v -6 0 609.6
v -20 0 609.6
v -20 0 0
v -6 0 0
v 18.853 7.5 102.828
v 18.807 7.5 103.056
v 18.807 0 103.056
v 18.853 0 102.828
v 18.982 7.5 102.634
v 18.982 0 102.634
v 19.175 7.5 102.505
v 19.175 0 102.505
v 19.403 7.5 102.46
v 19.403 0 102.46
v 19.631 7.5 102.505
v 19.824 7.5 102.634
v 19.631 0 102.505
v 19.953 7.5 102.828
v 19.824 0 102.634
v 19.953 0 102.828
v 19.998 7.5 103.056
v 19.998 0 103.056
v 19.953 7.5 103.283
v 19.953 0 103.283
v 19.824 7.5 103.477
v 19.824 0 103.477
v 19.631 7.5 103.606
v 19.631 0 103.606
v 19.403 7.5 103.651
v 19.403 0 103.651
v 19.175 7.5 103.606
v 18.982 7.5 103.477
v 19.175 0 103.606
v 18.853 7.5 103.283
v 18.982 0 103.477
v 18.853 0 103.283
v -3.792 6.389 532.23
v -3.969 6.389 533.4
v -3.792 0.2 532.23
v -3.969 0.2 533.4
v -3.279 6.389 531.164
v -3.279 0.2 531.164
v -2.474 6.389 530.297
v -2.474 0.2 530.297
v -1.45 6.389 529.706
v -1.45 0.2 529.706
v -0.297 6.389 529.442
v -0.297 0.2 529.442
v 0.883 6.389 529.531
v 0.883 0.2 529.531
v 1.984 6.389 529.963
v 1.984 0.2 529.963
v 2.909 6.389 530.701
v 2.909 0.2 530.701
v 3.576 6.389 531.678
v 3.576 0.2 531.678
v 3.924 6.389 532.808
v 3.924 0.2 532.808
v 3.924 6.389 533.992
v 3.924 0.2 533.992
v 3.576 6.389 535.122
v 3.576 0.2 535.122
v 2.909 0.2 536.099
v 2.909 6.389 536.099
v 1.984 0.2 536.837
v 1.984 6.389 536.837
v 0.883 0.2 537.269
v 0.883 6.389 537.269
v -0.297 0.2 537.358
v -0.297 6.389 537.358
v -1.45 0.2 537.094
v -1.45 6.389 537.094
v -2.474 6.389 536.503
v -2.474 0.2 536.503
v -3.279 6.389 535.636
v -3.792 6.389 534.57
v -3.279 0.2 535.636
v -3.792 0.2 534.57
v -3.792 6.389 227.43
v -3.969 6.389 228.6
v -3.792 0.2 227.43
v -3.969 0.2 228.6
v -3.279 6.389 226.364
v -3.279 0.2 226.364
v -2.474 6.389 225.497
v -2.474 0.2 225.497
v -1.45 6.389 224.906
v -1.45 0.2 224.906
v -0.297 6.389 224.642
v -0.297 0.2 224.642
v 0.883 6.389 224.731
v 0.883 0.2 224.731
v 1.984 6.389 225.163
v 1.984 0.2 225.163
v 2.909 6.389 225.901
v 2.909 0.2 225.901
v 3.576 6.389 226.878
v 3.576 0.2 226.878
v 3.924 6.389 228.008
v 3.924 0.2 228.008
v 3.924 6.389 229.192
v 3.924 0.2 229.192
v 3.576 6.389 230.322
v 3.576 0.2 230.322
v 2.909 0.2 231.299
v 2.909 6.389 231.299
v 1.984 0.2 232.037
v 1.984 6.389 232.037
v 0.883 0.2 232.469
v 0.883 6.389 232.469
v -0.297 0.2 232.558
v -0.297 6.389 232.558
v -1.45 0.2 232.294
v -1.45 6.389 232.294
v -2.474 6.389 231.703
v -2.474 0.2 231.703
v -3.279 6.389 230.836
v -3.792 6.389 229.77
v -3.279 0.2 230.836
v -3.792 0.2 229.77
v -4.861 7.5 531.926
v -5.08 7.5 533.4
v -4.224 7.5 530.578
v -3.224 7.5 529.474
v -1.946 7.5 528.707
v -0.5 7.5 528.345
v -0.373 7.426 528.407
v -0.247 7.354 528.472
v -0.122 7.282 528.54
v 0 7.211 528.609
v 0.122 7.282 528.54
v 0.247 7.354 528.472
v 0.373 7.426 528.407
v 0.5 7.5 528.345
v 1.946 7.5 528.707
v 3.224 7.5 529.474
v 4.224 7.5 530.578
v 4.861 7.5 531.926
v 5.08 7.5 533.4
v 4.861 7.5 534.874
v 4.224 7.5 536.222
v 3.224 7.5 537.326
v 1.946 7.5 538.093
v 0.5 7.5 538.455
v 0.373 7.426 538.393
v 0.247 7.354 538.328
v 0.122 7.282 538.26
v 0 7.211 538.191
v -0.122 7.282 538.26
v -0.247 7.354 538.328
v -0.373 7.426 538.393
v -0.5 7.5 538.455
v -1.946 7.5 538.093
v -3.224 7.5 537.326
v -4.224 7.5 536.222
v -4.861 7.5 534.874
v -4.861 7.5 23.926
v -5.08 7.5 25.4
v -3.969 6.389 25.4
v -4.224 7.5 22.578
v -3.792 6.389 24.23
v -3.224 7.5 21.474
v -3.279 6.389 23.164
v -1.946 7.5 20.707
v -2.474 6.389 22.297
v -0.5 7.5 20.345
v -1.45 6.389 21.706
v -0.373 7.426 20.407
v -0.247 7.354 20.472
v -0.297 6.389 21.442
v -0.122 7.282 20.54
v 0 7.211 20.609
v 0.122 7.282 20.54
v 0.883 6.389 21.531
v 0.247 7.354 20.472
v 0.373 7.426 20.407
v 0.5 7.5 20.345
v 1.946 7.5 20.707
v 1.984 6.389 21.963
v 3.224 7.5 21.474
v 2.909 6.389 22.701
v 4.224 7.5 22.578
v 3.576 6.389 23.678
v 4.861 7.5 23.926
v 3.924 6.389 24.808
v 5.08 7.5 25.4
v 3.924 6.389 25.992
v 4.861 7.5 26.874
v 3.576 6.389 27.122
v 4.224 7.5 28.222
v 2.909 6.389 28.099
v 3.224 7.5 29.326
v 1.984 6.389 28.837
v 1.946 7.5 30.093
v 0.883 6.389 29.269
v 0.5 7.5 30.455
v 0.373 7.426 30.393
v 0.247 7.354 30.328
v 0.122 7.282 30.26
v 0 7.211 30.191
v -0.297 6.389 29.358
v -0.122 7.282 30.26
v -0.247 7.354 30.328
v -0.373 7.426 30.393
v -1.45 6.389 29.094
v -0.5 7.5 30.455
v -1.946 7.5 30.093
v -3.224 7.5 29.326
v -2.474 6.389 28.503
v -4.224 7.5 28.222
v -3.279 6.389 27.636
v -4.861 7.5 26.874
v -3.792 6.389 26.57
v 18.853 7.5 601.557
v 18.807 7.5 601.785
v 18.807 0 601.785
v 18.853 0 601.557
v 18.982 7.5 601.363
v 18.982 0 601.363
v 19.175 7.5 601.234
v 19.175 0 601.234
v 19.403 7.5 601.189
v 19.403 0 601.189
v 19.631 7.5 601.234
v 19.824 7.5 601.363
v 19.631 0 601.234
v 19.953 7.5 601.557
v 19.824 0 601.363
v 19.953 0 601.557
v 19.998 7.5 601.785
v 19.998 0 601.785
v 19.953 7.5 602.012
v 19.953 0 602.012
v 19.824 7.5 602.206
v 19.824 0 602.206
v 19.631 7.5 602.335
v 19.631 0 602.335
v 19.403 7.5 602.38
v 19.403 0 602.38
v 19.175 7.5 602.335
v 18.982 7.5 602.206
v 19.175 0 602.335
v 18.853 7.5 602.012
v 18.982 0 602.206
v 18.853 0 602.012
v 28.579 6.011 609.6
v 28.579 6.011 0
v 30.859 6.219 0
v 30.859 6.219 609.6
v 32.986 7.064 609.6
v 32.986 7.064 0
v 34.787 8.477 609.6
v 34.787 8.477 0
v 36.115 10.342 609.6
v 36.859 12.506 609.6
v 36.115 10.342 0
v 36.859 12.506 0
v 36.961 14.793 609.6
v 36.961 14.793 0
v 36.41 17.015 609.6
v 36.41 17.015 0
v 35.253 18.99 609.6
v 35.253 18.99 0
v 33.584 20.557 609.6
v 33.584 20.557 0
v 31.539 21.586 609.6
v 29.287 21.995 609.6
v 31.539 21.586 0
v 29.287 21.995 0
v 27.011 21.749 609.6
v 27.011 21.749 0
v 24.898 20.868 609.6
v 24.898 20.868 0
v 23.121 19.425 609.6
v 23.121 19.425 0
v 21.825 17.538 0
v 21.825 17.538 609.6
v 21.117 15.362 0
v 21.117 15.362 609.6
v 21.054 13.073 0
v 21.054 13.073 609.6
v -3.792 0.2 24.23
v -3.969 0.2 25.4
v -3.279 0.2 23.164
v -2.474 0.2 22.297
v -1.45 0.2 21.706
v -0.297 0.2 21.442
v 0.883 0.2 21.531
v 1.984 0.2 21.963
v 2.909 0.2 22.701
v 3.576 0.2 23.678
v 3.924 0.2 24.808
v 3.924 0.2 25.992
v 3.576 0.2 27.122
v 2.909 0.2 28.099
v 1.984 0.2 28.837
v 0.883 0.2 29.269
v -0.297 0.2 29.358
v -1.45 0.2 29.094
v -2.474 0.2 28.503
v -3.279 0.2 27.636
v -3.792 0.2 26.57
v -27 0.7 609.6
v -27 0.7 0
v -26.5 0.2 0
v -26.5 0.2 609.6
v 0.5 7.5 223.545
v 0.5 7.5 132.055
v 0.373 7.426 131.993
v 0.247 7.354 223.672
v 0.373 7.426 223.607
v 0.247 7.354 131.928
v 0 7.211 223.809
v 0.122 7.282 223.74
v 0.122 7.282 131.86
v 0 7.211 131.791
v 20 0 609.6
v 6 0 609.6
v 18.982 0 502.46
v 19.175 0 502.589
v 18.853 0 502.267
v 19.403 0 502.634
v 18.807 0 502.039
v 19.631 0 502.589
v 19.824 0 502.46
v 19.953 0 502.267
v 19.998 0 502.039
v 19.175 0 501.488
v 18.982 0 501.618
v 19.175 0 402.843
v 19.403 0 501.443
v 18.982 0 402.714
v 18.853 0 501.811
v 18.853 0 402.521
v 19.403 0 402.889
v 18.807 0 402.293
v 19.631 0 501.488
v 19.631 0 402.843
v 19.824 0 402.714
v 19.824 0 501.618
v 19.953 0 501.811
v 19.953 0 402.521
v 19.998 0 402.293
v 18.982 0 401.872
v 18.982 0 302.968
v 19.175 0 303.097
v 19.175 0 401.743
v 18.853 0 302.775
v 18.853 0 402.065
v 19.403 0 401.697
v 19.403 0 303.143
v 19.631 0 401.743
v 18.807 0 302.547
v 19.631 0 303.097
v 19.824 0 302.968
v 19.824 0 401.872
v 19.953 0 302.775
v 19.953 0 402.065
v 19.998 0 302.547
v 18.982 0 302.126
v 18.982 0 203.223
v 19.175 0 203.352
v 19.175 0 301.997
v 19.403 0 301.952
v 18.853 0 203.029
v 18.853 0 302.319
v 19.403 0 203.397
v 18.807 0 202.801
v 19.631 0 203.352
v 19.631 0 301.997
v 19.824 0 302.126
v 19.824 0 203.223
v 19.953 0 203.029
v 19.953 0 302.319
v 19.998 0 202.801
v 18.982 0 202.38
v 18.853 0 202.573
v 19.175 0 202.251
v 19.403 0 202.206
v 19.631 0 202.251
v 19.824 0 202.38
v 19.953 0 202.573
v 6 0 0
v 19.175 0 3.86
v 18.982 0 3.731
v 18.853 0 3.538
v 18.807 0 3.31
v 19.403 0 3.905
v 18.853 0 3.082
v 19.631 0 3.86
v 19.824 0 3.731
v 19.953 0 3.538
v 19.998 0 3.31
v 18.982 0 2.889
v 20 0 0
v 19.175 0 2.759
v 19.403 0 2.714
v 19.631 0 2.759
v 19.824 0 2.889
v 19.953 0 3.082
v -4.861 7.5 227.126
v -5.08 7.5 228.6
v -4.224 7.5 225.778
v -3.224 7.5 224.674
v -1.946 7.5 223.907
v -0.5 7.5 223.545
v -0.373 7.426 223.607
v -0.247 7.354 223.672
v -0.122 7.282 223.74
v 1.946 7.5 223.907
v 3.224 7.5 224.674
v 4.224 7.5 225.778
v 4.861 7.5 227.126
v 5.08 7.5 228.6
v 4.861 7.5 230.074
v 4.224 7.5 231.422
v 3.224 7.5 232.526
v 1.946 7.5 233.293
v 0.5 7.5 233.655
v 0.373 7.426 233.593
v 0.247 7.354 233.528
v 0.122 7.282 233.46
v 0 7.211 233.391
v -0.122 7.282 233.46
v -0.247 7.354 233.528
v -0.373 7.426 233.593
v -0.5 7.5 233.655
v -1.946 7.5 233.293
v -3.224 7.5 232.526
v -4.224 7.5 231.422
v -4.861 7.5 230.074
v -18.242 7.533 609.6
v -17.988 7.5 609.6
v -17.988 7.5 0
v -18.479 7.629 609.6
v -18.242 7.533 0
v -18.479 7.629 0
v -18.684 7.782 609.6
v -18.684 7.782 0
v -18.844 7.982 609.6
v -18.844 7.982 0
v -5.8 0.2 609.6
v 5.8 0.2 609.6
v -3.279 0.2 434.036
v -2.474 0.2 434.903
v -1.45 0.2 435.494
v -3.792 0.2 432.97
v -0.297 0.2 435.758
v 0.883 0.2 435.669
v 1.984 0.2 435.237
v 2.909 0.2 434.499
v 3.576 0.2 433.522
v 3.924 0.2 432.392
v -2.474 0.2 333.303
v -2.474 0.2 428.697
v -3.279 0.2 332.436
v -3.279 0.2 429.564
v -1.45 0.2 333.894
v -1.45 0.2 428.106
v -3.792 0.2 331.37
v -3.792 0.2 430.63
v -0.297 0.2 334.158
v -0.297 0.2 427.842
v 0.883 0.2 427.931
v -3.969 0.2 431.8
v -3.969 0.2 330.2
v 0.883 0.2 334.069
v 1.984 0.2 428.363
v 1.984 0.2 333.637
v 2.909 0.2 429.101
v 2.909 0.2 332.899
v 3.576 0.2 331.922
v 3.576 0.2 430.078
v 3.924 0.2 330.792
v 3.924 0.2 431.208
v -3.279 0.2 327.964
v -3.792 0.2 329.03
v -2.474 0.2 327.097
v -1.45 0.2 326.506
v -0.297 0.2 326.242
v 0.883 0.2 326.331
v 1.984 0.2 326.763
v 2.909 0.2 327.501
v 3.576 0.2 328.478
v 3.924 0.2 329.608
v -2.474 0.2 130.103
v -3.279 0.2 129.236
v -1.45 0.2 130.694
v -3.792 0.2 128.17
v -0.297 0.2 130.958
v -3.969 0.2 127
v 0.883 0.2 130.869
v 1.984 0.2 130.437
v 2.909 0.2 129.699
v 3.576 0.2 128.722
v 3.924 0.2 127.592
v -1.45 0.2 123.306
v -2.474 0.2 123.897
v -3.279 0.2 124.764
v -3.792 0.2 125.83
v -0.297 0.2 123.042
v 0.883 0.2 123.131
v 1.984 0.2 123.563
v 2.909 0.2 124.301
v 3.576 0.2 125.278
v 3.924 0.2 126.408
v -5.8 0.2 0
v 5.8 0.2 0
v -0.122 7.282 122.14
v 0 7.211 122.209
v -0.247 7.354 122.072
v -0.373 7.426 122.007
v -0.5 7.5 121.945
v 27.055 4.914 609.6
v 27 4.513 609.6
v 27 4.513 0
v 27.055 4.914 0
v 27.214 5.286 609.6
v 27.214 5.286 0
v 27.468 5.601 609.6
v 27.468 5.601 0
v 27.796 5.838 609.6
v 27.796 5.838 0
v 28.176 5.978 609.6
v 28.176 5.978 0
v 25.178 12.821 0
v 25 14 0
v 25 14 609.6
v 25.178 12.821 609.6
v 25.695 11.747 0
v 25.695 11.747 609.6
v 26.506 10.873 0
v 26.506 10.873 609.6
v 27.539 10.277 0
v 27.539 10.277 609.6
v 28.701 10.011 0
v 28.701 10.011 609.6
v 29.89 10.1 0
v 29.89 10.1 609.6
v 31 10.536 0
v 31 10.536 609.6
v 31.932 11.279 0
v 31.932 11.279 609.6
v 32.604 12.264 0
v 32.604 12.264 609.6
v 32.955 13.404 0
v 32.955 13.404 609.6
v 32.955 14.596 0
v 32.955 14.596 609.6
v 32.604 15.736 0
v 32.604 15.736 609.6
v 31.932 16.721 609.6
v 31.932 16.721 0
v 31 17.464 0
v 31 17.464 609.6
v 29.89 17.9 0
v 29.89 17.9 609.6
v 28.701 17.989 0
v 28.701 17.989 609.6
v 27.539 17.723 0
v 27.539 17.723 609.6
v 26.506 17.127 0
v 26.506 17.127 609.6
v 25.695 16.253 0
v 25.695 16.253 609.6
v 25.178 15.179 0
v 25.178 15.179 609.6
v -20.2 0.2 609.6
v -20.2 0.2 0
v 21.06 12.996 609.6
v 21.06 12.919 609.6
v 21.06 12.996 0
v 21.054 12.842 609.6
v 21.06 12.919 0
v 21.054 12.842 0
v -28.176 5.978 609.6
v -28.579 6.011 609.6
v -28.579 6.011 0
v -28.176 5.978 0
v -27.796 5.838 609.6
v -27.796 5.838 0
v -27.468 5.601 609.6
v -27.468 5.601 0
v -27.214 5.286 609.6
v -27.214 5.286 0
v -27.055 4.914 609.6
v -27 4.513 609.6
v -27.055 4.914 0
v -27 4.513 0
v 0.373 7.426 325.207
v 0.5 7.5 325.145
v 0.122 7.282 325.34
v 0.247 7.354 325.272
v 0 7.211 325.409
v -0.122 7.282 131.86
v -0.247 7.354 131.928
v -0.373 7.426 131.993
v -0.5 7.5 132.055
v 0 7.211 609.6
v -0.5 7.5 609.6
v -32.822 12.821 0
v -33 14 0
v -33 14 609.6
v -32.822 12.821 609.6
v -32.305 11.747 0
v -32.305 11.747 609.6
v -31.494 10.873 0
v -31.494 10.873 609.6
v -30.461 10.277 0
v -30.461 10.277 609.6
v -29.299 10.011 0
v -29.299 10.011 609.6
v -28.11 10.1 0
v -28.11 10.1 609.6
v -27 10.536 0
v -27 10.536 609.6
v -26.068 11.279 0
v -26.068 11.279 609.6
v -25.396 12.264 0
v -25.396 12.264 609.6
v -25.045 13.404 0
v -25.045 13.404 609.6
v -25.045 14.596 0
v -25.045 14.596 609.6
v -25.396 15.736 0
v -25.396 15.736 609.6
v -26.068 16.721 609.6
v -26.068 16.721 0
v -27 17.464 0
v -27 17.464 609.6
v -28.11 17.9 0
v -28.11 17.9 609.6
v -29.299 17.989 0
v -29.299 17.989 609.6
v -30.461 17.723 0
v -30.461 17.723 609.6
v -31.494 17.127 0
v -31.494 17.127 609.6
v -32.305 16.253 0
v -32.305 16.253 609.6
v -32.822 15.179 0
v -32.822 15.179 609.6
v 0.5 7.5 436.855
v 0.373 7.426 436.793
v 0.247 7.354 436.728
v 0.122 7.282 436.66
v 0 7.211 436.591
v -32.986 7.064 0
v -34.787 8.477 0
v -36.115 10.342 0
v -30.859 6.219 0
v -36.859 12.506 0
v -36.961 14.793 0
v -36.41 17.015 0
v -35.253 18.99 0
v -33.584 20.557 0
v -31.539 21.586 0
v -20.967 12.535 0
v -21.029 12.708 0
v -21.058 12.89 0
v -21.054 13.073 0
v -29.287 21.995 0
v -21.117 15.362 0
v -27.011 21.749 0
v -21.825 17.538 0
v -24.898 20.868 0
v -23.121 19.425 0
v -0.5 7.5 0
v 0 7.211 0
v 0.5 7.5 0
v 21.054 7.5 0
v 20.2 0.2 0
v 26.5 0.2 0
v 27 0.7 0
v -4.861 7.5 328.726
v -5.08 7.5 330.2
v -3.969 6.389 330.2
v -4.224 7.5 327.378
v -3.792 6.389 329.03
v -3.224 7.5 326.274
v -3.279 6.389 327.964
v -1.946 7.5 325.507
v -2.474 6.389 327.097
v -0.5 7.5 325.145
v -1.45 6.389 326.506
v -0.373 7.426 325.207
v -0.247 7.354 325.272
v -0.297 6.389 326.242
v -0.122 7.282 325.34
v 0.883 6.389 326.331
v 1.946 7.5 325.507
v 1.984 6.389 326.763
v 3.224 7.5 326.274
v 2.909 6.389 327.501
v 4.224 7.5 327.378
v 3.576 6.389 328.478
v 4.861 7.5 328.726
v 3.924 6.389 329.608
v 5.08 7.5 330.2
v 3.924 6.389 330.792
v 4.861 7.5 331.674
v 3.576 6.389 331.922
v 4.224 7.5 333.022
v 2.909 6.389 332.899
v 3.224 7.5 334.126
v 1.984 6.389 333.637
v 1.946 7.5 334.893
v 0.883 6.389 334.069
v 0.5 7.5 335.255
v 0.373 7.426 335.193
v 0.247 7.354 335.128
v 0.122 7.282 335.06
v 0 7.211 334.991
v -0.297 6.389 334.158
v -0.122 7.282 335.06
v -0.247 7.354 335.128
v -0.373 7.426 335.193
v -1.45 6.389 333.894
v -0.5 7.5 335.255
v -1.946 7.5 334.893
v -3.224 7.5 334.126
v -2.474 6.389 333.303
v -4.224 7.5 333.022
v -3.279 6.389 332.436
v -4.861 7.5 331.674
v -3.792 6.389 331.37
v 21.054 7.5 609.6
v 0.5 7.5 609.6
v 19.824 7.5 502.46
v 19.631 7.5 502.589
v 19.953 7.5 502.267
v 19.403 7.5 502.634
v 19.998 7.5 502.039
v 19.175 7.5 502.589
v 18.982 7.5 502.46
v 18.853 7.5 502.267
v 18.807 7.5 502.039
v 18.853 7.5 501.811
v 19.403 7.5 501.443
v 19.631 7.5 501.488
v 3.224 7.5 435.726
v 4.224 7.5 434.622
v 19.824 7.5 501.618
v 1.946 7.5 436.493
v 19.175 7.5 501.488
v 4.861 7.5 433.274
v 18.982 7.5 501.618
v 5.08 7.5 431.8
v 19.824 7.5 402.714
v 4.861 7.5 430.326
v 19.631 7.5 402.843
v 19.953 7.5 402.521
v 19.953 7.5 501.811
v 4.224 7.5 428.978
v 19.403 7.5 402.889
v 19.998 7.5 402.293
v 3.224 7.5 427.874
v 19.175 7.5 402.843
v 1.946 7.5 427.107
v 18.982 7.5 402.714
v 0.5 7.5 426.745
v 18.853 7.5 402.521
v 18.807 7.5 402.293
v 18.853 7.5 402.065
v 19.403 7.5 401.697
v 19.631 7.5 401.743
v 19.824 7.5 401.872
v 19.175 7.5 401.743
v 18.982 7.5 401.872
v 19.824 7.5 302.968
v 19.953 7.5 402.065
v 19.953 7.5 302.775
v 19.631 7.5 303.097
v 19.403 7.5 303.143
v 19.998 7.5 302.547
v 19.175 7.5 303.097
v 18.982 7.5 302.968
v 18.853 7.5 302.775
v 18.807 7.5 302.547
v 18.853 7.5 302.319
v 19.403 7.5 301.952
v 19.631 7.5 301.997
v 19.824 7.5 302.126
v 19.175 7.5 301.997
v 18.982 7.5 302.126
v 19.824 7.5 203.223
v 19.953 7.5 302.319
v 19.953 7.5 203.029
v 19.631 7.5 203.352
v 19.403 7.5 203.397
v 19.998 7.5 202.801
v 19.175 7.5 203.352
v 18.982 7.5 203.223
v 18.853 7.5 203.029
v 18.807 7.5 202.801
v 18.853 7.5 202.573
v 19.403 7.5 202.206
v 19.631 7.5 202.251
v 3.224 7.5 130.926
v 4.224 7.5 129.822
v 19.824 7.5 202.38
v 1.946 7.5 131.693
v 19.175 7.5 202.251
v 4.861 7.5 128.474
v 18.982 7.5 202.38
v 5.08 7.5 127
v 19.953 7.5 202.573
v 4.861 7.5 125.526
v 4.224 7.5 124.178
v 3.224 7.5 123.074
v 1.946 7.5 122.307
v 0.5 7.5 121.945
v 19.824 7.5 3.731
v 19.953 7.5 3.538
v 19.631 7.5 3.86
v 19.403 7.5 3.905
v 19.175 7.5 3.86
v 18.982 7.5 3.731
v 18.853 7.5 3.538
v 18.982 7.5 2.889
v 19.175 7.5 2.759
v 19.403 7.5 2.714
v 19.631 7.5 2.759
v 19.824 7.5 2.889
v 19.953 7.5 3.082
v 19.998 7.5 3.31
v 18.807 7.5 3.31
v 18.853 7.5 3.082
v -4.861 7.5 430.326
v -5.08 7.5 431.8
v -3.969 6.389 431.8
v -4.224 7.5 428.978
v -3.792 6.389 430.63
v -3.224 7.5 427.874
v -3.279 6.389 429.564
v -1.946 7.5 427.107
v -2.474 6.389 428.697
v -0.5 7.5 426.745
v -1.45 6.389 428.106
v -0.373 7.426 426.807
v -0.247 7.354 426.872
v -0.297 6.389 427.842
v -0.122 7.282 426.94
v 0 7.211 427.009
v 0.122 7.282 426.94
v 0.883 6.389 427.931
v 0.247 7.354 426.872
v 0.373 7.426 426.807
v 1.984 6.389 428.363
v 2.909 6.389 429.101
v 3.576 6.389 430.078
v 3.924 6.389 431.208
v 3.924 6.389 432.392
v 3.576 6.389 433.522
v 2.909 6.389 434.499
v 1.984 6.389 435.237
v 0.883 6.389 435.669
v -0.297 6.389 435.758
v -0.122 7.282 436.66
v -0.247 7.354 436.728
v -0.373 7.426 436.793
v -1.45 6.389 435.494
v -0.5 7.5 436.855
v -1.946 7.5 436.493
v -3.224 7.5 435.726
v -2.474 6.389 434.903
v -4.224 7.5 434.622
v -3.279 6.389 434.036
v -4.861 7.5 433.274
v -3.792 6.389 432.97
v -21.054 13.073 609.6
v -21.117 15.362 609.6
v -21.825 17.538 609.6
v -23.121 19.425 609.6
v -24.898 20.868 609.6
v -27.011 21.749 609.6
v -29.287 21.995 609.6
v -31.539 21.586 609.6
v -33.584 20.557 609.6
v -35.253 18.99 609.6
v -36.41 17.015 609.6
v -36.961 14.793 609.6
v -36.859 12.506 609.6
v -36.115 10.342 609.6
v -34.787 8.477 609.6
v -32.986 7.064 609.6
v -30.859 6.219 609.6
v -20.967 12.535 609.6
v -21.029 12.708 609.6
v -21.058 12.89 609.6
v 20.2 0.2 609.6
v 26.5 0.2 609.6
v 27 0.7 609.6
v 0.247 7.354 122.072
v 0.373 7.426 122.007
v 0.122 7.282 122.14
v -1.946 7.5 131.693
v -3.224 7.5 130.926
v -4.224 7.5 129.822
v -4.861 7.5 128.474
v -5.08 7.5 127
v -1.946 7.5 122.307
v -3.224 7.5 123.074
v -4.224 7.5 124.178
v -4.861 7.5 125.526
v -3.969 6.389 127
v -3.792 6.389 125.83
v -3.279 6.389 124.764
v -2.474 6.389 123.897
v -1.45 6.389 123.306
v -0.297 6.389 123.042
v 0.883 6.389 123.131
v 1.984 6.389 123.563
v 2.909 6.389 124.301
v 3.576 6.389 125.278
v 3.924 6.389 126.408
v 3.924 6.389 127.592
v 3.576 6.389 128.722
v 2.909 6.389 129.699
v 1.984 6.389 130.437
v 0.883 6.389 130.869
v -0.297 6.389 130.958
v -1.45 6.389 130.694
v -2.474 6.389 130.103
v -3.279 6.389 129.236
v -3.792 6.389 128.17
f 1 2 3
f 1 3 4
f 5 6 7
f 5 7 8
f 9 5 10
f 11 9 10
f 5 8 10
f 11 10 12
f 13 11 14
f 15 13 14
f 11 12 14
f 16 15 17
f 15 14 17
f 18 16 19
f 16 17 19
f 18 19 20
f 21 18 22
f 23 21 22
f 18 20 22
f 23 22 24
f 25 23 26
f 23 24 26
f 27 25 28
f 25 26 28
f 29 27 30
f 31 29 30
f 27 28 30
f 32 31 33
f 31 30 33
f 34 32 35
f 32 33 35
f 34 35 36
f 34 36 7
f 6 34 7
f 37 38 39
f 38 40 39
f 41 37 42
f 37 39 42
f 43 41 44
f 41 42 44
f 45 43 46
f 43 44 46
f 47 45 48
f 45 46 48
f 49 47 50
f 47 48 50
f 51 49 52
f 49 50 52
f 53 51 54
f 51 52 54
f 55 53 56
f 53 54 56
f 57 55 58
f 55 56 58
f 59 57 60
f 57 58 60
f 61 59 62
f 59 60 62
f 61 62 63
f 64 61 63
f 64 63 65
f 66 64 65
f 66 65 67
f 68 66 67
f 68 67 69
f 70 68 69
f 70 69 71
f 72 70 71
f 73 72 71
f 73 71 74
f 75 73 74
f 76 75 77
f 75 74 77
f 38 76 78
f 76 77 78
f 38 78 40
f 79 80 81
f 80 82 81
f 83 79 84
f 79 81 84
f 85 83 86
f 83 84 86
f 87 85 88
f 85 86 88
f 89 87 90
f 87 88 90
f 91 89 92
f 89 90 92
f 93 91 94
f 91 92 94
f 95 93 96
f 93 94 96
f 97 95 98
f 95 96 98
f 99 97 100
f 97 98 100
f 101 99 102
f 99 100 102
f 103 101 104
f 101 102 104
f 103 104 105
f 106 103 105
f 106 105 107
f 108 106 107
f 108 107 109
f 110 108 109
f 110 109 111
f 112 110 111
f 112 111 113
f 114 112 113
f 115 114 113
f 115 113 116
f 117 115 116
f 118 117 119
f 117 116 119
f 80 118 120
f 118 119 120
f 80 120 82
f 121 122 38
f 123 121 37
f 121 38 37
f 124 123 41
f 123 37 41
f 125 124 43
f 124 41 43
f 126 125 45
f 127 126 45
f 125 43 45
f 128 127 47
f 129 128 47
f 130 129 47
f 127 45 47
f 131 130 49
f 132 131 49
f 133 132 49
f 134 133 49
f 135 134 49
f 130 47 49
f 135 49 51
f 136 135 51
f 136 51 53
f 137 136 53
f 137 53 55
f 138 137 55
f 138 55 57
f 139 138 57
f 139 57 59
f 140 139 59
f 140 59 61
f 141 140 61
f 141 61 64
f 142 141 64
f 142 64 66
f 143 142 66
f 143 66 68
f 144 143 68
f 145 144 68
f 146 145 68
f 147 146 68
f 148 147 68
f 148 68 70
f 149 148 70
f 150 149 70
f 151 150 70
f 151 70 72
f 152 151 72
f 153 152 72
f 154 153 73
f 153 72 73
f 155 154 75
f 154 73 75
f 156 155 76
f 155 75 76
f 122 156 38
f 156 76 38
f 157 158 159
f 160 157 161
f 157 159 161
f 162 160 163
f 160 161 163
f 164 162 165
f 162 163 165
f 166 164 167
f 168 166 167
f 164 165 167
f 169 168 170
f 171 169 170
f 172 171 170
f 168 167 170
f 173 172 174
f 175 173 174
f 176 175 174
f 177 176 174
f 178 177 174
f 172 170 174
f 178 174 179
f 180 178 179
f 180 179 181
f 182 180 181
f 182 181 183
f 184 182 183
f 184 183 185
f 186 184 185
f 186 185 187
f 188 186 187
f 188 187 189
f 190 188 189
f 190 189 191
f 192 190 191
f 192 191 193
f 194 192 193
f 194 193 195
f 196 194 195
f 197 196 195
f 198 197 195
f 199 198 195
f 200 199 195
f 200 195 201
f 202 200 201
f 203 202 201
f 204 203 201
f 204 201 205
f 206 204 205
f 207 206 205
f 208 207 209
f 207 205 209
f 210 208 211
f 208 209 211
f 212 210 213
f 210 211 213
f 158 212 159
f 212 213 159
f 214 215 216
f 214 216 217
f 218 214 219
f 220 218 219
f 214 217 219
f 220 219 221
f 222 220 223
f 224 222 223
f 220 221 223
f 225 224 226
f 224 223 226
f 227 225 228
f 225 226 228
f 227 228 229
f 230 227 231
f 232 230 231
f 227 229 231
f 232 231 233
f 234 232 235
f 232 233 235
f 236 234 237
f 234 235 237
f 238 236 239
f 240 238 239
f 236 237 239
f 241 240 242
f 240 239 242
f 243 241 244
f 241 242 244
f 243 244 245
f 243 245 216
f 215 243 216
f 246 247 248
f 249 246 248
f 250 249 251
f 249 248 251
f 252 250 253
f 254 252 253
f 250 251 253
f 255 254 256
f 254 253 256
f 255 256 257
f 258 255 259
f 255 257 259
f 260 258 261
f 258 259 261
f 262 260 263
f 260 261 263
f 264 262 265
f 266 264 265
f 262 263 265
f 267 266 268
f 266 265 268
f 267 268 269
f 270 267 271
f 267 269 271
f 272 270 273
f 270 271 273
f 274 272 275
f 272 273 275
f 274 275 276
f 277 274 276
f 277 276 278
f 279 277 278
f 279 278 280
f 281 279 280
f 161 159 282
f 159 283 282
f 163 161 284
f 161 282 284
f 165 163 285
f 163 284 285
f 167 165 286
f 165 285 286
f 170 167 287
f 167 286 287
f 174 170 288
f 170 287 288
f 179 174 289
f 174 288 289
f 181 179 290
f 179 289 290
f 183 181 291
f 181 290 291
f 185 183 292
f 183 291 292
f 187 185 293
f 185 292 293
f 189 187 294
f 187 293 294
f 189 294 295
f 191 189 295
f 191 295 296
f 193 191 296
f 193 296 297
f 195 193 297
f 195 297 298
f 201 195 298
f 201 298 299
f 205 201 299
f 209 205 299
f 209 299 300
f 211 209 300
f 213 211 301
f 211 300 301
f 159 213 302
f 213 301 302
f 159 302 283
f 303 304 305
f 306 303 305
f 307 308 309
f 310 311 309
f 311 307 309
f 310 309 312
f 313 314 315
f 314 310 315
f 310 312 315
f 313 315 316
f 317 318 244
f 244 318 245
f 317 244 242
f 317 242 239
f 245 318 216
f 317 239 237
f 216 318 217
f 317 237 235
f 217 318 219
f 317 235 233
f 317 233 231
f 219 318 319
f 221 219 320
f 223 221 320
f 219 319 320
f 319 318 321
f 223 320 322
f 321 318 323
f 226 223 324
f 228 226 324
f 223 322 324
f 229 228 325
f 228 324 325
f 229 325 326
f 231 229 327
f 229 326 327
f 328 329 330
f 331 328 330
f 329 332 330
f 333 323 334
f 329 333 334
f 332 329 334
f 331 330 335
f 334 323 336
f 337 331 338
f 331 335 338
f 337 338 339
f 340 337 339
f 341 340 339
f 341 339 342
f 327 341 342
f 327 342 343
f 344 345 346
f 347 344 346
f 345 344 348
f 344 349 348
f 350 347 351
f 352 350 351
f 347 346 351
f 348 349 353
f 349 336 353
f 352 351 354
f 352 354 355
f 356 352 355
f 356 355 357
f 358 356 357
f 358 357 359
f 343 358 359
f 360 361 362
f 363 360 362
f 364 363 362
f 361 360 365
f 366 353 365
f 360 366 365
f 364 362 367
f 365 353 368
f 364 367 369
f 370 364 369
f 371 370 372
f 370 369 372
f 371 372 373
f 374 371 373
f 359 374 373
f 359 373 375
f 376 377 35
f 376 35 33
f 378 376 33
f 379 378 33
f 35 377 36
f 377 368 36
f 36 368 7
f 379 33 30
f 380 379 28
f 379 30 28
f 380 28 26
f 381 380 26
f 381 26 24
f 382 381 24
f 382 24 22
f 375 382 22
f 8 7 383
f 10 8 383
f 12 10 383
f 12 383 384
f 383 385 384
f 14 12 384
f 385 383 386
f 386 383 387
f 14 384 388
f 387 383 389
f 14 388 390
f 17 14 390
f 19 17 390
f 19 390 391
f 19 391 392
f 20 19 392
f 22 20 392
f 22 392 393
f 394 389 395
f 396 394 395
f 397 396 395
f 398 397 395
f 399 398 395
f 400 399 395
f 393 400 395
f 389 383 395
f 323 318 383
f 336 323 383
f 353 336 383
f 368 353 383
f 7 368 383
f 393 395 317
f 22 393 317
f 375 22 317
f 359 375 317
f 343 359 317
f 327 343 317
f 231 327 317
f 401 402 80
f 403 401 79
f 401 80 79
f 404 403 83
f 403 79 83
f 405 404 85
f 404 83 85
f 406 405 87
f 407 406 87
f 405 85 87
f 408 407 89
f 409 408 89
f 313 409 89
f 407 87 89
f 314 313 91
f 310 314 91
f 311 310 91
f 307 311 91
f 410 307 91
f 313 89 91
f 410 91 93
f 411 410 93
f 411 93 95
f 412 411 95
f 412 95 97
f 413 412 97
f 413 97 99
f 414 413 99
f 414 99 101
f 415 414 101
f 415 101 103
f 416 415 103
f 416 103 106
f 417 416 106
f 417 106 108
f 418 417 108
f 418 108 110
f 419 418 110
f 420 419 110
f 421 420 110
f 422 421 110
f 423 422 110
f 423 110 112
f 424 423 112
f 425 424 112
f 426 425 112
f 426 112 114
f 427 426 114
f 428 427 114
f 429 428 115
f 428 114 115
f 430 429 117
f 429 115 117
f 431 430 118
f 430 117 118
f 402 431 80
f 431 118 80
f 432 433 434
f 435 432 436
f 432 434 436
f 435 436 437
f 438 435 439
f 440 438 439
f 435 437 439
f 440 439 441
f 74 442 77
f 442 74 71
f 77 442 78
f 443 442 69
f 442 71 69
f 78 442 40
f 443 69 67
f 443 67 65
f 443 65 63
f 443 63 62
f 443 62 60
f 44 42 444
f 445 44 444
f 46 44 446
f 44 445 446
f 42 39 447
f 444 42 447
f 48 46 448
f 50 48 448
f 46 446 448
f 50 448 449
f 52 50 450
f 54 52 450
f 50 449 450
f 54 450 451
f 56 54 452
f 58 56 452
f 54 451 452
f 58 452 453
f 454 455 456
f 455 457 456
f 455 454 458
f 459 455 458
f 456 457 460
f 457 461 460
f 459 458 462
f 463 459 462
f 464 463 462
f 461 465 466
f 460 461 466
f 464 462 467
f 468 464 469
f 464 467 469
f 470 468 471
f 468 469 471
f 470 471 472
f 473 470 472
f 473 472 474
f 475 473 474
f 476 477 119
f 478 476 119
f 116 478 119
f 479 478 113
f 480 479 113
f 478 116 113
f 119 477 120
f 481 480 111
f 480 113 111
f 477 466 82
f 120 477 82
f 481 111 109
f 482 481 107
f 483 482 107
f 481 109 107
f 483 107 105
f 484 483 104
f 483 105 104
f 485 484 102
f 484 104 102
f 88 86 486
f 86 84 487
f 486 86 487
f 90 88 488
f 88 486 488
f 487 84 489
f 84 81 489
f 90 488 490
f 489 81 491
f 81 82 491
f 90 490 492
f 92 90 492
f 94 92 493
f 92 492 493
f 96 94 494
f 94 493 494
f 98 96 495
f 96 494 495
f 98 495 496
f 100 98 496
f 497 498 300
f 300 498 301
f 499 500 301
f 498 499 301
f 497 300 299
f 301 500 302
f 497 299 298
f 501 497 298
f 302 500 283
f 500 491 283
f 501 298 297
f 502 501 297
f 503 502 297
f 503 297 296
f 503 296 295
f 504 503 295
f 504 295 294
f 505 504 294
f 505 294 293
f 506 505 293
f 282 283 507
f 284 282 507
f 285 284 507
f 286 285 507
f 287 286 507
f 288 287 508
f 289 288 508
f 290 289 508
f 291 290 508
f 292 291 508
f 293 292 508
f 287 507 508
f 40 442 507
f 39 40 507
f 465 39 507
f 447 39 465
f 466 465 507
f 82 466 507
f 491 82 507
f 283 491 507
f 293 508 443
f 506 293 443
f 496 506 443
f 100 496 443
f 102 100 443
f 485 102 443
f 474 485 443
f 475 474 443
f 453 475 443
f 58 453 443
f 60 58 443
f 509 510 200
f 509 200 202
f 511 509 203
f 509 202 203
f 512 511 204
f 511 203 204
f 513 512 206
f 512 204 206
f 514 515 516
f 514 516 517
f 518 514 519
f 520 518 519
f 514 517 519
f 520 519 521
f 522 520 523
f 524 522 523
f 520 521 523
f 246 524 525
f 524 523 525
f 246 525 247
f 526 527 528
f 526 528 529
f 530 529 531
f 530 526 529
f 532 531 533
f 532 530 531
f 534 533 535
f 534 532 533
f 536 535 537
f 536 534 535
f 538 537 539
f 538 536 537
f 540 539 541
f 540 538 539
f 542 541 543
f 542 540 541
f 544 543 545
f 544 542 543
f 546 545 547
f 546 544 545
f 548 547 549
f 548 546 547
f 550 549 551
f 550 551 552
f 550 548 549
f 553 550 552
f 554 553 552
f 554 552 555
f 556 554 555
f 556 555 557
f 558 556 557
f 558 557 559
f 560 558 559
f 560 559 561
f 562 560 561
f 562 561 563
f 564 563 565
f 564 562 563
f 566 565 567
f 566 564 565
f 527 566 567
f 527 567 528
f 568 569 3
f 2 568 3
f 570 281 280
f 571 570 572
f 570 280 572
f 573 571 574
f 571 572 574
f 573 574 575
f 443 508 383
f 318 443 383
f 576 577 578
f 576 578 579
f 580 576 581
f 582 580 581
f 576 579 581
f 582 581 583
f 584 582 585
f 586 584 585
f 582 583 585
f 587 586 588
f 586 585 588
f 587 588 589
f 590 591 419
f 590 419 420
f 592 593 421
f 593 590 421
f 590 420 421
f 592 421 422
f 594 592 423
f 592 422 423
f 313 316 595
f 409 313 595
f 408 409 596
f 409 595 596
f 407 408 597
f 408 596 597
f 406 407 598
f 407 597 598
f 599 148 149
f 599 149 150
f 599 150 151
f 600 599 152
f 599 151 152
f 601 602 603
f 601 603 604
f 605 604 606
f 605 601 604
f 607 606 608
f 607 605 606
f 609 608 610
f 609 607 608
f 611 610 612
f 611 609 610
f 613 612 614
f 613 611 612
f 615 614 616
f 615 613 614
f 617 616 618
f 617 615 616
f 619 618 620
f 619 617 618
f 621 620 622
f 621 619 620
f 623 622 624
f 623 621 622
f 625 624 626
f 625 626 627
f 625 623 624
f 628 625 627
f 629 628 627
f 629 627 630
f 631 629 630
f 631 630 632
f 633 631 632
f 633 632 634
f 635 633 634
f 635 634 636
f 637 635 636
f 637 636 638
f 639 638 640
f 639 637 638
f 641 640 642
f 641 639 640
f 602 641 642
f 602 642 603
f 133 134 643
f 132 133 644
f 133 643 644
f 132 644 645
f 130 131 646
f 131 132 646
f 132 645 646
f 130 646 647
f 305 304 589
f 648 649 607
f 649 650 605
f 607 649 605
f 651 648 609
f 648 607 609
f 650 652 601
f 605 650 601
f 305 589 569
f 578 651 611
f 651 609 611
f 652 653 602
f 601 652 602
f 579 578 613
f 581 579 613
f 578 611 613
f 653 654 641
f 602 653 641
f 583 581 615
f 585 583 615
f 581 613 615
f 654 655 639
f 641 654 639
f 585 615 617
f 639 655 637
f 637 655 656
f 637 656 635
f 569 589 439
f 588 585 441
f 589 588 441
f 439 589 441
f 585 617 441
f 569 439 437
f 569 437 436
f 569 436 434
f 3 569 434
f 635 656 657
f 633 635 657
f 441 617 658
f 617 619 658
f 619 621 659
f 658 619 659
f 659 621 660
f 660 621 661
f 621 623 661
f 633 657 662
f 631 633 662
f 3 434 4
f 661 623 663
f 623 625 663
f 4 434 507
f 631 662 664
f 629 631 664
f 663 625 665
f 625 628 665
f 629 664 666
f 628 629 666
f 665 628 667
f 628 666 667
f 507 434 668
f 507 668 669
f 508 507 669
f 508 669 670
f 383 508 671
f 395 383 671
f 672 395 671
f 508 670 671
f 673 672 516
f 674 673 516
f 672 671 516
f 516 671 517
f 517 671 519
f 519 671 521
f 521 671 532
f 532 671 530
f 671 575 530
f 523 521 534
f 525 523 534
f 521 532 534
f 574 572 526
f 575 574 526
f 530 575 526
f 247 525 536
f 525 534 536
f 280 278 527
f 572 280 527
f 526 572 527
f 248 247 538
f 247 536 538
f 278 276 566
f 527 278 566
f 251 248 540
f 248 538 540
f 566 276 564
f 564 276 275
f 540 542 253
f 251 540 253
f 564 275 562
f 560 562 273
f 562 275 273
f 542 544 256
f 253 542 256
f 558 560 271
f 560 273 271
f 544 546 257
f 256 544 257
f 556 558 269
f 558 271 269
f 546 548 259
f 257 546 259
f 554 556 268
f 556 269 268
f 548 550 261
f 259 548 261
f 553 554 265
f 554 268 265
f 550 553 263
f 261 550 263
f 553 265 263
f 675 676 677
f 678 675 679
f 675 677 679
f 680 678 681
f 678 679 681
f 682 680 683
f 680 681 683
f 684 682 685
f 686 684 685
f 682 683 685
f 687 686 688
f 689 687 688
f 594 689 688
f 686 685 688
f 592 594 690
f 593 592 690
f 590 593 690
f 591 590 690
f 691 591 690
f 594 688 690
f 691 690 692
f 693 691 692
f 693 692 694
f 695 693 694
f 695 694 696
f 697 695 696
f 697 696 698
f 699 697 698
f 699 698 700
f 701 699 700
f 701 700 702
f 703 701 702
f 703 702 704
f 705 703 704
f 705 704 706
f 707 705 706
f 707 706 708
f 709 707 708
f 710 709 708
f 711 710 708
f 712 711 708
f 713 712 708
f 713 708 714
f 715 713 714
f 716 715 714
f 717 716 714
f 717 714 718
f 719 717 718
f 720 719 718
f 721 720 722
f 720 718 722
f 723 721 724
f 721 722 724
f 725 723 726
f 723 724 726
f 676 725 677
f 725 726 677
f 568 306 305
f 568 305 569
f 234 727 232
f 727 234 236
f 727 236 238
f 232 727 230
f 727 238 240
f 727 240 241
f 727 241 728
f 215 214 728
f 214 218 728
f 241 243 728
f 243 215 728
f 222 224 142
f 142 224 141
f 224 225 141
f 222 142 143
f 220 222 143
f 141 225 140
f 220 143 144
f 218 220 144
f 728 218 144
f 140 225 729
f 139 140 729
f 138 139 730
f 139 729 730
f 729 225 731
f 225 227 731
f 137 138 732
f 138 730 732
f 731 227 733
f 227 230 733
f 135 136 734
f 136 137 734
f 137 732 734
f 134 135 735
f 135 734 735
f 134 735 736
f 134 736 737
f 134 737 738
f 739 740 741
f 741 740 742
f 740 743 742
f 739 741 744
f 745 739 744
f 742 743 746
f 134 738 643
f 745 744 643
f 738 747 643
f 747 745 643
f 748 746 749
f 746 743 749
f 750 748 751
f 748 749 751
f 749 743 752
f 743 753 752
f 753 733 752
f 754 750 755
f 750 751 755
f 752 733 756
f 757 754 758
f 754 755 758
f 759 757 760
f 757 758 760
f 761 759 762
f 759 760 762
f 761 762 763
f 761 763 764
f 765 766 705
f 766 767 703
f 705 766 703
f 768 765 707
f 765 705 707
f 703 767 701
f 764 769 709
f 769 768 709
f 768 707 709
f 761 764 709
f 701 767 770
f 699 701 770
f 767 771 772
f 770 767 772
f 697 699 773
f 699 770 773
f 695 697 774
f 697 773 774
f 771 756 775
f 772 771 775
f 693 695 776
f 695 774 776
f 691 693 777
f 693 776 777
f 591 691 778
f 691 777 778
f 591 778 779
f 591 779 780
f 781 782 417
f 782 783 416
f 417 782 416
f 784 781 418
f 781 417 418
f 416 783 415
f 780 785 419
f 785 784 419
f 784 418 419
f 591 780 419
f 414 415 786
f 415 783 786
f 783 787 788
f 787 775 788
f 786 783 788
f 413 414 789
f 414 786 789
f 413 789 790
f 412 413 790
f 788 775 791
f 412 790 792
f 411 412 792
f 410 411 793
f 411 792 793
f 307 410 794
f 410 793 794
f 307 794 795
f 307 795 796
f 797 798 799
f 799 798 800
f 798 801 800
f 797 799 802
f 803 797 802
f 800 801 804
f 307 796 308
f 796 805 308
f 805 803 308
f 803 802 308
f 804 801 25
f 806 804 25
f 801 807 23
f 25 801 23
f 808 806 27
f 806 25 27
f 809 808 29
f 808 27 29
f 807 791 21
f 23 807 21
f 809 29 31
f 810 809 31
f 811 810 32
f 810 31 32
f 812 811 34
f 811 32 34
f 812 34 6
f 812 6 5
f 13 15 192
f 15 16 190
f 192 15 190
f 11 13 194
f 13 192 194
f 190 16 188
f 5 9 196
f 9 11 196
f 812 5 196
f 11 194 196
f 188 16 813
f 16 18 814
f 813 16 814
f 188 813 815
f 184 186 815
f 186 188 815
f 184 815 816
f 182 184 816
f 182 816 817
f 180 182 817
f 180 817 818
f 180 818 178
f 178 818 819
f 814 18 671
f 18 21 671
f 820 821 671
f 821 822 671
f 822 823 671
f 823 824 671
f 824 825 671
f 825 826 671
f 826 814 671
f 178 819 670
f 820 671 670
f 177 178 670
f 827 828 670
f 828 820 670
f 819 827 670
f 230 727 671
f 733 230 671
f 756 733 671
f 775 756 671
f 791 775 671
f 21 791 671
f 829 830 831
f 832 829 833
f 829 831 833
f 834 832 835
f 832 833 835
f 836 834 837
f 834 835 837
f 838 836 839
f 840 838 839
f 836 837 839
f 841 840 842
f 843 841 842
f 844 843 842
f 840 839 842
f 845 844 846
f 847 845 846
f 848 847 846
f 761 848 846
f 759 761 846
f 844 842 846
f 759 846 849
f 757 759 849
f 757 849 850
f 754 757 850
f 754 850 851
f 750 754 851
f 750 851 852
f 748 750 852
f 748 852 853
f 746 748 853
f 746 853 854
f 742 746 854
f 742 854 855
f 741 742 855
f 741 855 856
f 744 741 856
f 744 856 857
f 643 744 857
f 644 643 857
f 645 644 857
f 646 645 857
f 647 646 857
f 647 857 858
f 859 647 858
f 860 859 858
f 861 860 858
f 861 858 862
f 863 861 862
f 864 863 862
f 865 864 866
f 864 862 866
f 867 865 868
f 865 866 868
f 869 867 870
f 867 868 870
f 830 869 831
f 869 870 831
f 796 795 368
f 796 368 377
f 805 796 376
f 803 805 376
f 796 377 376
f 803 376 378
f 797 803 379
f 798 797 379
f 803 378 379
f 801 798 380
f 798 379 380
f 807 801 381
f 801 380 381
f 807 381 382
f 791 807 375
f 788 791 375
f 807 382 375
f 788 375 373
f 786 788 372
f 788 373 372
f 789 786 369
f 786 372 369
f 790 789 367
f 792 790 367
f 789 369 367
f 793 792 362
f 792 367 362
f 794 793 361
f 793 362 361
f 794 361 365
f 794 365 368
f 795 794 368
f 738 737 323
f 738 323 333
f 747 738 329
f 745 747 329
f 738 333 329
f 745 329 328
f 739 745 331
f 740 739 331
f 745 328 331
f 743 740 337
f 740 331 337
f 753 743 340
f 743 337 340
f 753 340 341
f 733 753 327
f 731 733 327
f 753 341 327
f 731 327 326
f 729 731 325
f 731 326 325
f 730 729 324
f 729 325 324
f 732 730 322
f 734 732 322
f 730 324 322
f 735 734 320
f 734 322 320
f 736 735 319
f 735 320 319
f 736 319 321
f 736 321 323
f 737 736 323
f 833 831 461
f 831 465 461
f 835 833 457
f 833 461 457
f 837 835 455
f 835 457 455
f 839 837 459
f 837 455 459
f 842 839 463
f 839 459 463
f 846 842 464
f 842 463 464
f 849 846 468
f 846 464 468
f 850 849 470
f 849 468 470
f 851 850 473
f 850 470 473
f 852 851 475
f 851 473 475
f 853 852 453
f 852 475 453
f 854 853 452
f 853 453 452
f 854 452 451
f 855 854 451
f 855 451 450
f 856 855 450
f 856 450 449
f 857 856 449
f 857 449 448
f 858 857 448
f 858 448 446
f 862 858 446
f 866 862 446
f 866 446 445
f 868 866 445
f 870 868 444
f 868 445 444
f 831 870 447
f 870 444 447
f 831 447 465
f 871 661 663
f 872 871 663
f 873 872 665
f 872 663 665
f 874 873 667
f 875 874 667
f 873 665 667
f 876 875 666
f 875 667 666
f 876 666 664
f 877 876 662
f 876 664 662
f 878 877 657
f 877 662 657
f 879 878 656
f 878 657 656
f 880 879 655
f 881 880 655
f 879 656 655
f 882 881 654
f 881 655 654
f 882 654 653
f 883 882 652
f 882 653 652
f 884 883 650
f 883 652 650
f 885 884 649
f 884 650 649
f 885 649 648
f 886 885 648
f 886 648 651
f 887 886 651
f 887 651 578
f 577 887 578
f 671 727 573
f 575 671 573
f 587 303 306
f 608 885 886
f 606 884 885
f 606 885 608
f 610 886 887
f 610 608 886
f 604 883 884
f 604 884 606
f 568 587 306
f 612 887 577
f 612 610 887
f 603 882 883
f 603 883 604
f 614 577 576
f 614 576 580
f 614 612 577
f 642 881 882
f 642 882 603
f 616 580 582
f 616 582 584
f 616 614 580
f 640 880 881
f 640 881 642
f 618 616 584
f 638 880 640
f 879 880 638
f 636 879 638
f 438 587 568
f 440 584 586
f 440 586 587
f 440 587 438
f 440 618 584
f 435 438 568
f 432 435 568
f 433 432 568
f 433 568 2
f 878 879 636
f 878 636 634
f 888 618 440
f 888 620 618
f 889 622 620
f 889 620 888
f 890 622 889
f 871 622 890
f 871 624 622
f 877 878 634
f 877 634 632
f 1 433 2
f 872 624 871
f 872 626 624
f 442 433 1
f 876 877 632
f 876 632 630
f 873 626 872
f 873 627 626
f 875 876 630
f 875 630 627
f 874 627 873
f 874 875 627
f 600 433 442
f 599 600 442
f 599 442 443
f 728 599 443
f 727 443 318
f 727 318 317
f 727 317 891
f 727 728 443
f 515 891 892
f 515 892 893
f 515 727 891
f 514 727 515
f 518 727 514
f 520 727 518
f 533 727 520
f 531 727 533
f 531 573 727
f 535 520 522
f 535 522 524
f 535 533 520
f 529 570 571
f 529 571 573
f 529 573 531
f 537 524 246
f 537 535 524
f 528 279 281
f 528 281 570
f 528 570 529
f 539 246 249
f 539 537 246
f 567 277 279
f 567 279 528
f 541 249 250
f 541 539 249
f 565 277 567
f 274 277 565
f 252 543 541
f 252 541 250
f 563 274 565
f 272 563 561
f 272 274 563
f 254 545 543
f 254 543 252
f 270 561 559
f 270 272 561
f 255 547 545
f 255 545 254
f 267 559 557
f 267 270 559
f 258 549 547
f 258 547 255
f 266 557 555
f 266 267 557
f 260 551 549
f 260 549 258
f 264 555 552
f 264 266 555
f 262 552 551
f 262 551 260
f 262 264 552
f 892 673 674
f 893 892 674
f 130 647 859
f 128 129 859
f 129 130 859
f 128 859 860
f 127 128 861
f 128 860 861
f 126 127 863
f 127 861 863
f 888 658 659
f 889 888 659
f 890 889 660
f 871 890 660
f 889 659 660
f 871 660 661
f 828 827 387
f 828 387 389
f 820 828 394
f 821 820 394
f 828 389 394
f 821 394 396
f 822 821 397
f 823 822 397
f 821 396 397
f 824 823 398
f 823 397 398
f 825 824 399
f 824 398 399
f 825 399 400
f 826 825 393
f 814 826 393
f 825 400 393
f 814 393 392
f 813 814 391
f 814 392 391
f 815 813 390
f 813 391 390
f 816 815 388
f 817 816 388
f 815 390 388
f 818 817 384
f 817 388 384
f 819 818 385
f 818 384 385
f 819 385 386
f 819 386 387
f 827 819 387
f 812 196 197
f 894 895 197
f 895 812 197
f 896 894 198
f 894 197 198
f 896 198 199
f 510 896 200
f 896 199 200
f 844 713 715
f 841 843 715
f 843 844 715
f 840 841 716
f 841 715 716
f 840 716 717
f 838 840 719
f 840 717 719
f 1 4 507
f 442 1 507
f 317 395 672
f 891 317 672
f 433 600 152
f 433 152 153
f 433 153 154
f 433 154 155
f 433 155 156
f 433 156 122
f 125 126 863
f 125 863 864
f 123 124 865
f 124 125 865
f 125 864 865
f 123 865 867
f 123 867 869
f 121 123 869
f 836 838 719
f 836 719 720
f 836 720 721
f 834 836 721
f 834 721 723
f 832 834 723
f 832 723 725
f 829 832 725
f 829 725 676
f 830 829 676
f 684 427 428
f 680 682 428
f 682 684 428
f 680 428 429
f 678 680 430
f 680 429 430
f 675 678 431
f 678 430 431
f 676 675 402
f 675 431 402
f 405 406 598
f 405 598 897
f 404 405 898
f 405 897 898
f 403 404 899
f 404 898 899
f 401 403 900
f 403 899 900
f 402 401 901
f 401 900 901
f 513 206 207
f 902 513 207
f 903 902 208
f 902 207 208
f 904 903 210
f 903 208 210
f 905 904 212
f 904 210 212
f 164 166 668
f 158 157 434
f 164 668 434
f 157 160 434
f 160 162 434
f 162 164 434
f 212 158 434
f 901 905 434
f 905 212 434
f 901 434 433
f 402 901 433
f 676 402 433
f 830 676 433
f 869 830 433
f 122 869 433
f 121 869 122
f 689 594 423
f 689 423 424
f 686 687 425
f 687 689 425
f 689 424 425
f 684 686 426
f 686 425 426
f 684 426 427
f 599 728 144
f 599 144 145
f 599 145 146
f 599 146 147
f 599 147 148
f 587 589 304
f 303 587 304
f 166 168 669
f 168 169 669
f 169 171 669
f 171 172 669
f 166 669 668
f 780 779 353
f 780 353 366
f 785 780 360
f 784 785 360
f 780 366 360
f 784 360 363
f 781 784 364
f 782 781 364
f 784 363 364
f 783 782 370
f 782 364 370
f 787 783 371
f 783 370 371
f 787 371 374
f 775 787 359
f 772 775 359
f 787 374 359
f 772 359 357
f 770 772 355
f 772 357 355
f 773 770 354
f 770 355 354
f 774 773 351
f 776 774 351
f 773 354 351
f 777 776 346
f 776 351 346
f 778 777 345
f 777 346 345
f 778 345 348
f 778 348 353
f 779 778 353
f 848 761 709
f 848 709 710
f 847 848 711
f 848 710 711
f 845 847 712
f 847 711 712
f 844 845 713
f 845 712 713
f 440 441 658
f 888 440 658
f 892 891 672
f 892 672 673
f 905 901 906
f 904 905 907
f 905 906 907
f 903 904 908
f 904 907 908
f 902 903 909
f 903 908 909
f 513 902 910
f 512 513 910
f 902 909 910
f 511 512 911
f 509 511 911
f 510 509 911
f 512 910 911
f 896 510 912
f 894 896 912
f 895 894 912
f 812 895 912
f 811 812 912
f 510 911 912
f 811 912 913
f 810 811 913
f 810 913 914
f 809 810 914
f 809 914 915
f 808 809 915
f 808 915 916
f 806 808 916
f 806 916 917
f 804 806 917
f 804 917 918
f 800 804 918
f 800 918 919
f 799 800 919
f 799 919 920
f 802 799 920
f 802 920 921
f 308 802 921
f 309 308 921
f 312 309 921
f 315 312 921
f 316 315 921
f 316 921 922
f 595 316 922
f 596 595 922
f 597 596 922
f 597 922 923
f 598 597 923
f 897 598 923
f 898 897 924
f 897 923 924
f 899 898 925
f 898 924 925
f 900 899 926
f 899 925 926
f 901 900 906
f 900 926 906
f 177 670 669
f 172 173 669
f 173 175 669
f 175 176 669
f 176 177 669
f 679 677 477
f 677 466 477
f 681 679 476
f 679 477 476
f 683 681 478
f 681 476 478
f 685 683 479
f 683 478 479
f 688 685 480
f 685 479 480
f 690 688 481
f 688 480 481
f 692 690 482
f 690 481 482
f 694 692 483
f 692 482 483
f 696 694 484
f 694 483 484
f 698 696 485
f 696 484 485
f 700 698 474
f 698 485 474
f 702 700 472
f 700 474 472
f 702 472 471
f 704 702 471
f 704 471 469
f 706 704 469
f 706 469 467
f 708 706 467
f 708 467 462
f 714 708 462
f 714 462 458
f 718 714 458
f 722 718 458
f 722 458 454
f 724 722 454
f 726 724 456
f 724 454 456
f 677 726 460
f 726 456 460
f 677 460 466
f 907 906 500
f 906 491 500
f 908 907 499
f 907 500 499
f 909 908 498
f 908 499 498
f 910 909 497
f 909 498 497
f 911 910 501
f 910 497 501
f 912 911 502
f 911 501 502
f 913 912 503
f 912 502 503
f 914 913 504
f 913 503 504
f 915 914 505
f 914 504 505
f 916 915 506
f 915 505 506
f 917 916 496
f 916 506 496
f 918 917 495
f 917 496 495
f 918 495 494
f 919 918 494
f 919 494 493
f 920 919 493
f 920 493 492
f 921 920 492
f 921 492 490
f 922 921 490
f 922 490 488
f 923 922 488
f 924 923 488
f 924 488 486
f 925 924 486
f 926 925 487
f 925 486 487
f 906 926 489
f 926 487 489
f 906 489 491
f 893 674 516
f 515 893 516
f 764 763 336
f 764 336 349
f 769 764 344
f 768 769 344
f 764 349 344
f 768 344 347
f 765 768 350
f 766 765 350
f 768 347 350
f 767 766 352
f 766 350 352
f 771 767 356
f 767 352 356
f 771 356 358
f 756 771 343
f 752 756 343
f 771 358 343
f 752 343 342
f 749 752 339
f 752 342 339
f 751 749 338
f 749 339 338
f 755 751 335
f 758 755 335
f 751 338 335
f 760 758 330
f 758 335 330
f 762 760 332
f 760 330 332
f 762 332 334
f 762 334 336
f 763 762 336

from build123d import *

# Parameters (mm, degrees)
MODEL_R                           = 3.999999997
BOSS_EXTRUDE1_DEPTH               = 609.6
F_3_8_16_TAPPED_HOLE1_D           = 7.9375
F_3_8_16_TAPPED_HOLE1_CSINK_D     = 10.16
F_3_8_16_TAPPED_HOLE1_CSINK_ANGLE = 90
CUT_EXTRUDE1_DEPTH                = 612.11795915
TAP_DRILL_FOR_0_80_TAP1_D         = 1.19126


with BuildPart() as part:
    # Model → Boss-Extrude1 (new body)
    with BuildSketch(Plane.XY):
        with BuildLine():
            Line((-18.843780991, 7.981867858), (-20.966888929, 12.534890876))
            ThreePointArc((-20.966888929, 12.534890876), (-21.047789267, 12.798072701), (-21.053849819, 13.07334131))
            ThreePointArc((-21.053849819, 13.07334131), (-34.474612004, 19.833405747), (-28.578947374, 6.011088019))
            ThreePointArc((-28.578947374, 6.011088019), (-27.4676292, 5.601381399), (-27.000000001, 4.513167022))
            Line((-27.000000001, 4.513167022), (-27.000000001, 0.700000022))
            Line((-27.000000001, 0.700000022), (-26.500000001, 0.200000022))
            Line((-26.500000001, 0.200000022), (-20.200001001, 0.200000022))
            Line((-20.200001001, 0.200000022), (-20.000000979, 0))
            Line((-20.000000979, 0), (-6.000000502, 0))
            Line((-6.000000502, 0), (-5.80000048, 0.200000022))
            Line((-5.80000048, 0.200000022), (5.80000048, 0.200000022))
            Line((5.80000048, 0.200000022), (6.000000502, 0))
            Line((6.000000502, 0), (20.000000979, 0))
            Line((20.000000979, 0), (20.200001001, 0.200000022))
            Line((20.200001001, 0.200000022), (26.500000001, 0.200000022))
            Line((26.500000001, 0.200000022), (27.000000001, 0.700000022))
            Line((27.000000001, 0.700000022), (27.000000001, 4.513167022))
            ThreePointArc((27.000000001, 4.513167022), (27.4676292, 5.601381399), (28.578947374, 6.011088019))
            ThreePointArc((28.578947374, 6.011088019), (34.474612004, 19.833405747), (21.053849819, 13.07334131))
            ThreePointArc((21.053849819, 13.07334131), (21.047789267, 12.798072701), (20.966888929, 12.534890876))
            Line((20.966888929, 12.534890876), (18.843780991, 7.981867858))
            ThreePointArc((18.843780991, 7.981867858), (18.479330527, 7.628755749), (17.98848008, 7.499999621))
            Line((17.98848008, 7.499999621), (0.500000254, 7.499999621))
            Line((0.500000254, 7.499999621), (0, 7.211324621))
            Line((0, 7.211324621), (-0.500000254, 7.499999621))
            Line((-0.500000254, 7.499999621), (-17.98848008, 7.499999621))
            ThreePointArc((-17.98848008, 7.499999621), (-18.479330527, 7.628755749), (-18.843780991, 7.981867858))
        make_face()
        with Locations(Location((-29.000000026, 13.999999962, 0), (0, 0, 180))):
            Circle(MODEL_R, mode=Mode.SUBTRACT)
        with Locations(Location((29.000000026, 13.999999962, 0), (0, 0, 180))):
            Circle(MODEL_R, mode=Mode.SUBTRACT)
    extrude(amount=BOSS_EXTRUDE1_DEPTH)

    # 3/8-16 Tapped Hole1 (through all)
    with Locations(Plane(origin=(0, 7.499999621, 0), x_dir=(1, 0, 0), z_dir=(0, 1, 0))):
        with Locations((0, -25.4), (0, -127), (0, -228.6), (0, -330.2), (0, -431.8), (0, -533.4), (0, -635), (0, -736.6), (0, -838.2), (0, -939.8), (0, -1041.4), (0, -1143), (0, -1244.6), (0, -1346.2), (0, -1447.8), (0, -1549.4), (0, -1651), (0, -1752.6), (0, -1854.2), (0, -1955.8)):
            CounterSinkHole(F_3_8_16_TAPPED_HOLE1_D / 2, F_3_8_16_TAPPED_HOLE1_CSINK_D / 2, counter_sink_angle=F_3_8_16_TAPPED_HOLE1_CSINK_ANGLE)

    # Sketch3 → Cut-Extrude1 (cut, through all)
    with BuildSketch(Plane(origin=(0, 0, 0), x_dir=(-1, 0, 0), z_dir=(0, 0, -1))):
        Polygon((-17.98848008, 7.499999621), (-21.053849819, 7.499999621), (-21.053849819, 13.07334131), align=None)
    extrude(amount=-CUT_EXTRUDE1_DEPTH, mode=Mode.SUBTRACT)

    # Tap Drill for #0-80 Tap1 (through all)
    with Locations(Plane(origin=(0, 7.499999621, 0), x_dir=(1, 0, 0), z_dir=(0, 1, 0))):
        with Locations((19.402849819, -3.309755123), (19.402849819, -103.055555123), (19.402849819, -202.801355123), (19.402849819, -302.547155123), (19.402849819, -402.292955123), (19.402849819, -502.038755123), (19.402849819, -601.784555123), (19.402849819, -701.530355123), (19.402849819, -801.276155123), (19.402849819, -901.021955123)):
            Hole(TAP_DRILL_FOR_0_80_TAP1_D / 2)


solid = part.part
